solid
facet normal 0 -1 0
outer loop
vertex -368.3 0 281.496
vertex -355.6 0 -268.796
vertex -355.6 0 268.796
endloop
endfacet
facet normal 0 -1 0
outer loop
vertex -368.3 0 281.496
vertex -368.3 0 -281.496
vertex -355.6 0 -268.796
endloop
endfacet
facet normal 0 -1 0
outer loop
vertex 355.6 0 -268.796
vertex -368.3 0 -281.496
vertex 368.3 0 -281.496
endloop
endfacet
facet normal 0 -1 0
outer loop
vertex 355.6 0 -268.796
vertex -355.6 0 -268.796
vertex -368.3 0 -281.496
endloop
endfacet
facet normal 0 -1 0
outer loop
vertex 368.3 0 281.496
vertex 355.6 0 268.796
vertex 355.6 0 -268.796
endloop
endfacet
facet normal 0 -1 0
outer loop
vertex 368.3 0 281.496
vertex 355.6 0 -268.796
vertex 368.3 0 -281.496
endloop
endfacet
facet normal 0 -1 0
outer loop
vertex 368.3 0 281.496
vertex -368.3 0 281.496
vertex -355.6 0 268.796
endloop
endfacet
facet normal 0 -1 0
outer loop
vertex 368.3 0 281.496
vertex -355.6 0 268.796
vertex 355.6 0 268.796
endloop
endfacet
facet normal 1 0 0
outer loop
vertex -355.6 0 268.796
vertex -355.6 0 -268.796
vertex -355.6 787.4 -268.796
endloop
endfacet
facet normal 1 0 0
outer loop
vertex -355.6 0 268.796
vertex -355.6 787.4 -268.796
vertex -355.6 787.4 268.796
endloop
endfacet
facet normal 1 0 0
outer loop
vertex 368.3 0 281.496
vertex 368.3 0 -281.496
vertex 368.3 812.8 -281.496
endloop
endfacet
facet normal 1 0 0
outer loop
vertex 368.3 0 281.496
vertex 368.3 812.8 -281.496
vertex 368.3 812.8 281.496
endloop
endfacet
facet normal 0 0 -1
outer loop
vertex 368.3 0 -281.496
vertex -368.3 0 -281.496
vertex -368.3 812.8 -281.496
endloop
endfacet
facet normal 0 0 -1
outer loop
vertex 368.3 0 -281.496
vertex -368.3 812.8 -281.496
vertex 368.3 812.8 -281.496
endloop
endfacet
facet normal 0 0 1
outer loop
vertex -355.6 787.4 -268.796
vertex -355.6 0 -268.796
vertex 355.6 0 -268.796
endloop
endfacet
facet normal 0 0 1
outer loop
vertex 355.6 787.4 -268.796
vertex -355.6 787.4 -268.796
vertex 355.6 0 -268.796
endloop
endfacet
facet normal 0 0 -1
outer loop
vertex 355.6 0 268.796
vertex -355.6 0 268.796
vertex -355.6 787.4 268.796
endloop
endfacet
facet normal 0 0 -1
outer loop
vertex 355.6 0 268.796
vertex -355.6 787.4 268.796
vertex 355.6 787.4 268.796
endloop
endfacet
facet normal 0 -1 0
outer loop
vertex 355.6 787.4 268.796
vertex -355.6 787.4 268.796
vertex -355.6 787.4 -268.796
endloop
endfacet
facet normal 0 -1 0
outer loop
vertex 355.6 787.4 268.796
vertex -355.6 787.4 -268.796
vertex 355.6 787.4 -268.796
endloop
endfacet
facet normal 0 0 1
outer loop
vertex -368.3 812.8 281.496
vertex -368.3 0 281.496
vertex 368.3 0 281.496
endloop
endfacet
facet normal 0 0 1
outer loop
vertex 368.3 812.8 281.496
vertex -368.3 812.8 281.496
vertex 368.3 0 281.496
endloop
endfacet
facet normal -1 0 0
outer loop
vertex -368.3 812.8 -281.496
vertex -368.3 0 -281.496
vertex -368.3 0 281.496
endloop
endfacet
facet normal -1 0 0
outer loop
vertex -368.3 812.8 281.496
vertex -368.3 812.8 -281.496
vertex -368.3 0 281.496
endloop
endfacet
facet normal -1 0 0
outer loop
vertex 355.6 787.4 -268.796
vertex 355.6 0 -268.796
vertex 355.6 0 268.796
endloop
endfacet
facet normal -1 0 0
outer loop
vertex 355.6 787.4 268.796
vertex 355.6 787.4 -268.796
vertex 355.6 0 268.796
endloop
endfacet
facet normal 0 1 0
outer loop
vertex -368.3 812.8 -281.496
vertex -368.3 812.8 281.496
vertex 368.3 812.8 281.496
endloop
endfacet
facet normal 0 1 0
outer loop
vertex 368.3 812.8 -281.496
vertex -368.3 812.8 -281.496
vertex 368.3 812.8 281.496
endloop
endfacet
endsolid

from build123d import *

# Parameters (mm, degrees)
F0_W     = 736.6
F0_H     = 562.991
F0_W_2   = 711.2
F0_H_2   = 537.591
F1_DEPTH = 812.8
F2_DEPTH = 787.4


with BuildPart() as f1:
    # F0 (on Front) → F1 (new body)
    with BuildSketch(Plane.XZ):
        Rectangle(F0_W, F0_H)
        Rectangle(F0_W_2, F0_H_2, mode=Mode.SUBTRACT)
        Rectangle(F0_W_2, F0_H_2)
    extrude(amount=-F1_DEPTH)

    # F0 (on Front) → F2 (cut)
    with BuildSketch(Plane.XZ):
        Rectangle(F0_W_2, F0_H_2)
    extrude(amount=-F2_DEPTH, mode=Mode.SUBTRACT)


solid = f1.part
